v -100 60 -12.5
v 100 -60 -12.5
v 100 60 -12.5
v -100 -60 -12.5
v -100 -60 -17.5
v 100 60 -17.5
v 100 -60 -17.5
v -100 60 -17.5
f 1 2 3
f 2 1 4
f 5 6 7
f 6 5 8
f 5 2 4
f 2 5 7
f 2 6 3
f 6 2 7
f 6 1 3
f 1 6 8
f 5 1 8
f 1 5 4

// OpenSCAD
color("white")
	translate([0,0,-15])
		cube([200,120,5], center=true);
